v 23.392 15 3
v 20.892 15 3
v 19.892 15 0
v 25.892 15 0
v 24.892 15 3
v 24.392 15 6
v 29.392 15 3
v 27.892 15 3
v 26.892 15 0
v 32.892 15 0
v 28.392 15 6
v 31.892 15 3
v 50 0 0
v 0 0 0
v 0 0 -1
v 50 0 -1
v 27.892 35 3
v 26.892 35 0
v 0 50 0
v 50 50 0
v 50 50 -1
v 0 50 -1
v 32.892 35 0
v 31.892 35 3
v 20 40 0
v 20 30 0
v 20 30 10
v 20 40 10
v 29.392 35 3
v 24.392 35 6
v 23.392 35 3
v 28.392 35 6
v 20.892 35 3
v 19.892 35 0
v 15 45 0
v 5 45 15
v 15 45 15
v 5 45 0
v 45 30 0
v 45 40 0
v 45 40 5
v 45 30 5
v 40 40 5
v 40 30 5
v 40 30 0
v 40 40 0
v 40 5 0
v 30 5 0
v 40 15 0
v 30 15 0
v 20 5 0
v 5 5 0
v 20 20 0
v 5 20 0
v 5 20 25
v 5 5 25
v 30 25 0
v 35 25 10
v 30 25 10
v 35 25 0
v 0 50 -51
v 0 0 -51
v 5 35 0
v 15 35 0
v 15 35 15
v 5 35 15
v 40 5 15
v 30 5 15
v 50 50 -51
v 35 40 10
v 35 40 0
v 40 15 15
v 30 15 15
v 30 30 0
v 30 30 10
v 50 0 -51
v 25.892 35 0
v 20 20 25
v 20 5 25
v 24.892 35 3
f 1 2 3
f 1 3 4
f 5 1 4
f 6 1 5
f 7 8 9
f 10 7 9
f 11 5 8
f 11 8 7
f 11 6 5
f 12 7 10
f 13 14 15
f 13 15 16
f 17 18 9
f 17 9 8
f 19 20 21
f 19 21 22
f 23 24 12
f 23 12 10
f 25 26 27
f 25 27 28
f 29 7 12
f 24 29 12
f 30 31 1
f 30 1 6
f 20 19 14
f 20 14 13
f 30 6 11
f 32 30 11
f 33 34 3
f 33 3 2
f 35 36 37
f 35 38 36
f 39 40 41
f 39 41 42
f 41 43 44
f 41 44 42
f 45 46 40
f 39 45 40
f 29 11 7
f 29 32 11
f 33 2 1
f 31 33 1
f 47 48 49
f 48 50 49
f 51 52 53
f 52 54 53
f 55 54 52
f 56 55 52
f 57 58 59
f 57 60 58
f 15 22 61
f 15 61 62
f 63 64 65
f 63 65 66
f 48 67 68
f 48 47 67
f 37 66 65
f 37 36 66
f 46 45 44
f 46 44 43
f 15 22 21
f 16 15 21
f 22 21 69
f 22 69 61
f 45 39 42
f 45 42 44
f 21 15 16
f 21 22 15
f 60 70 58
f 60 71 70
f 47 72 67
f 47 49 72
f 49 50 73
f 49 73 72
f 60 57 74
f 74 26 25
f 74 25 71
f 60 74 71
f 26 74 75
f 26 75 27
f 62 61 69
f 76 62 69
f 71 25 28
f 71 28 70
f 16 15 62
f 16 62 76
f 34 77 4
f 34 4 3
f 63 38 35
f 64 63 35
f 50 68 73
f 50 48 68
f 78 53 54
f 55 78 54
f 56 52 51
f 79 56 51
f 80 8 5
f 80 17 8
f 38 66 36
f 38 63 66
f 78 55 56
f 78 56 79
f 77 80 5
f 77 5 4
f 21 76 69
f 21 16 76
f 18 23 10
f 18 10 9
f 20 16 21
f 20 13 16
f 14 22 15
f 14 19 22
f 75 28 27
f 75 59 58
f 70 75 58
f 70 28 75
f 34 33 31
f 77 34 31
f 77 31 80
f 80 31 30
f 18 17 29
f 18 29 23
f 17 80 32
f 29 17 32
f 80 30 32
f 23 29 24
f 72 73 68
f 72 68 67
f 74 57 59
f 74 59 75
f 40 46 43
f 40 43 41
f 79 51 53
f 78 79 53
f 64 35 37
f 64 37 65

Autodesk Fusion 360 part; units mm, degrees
sketch "Skizze1" plane through (0, 0, 0) normal (0, 0, 1) x (1, 0, 0)
  line L0 (0, 0) -> (50, 0)
  line L1 (50, 0) -> (50, 50)
  line L2 (50, 50) -> (0, 50)
  line L3 (0, 50) -> (0, 0)
  line L4 (20, 20) -> (5, 20)
  line L5 (5, 20) -> (5, 5)
  line L6 (5, 5) -> (20, 5)
  line L7 (20, 5) -> (20, 20)
  line L8 (20, 40) -> (35, 40)
  line L9 (35, 40) -> (35, 25)
  line L10 (35, 25) -> (30, 25)
  line L11 (30, 25) -> (30, 30)
  line L12 (30, 30) -> (20, 30)
  line L13 (20, 30) -> (20, 40)
  line L14 (5, 45) -> (15, 45)
  line L15 (15, 45) -> (15, 35)
  line L16 (15, 35) -> (5, 35)
  line L17 (5, 35) -> (5, 45)
  line L18 (30, 15) -> (40, 15)
  line L19 (40, 15) -> (40, 5)
  line L20 (40, 5) -> (30, 5)
  line L21 (30, 5) -> (30, 15)
  line L22 (40, 40) -> (45, 40)
  line L23 (45, 40) -> (45, 30)
  line L24 (45, 30) -> (40, 30)
  line L25 (40, 30) -> (40, 40)
extrude "Extrusion1" add sketch "Skizze1" along normal blind 25 contours L4 L5 L6 L7 makes body 1 in component "Großer Block"
extrude "Extrusion1'" add sketch "Skizze1" along normal blind 15 separate body contours L18 L19 L20 L21 makes body 2 in component "Medium Block 1"
extrude "Extrusion1''" add sketch "Skizze1" along normal blind 15 separate body contours L14 L15 L16 L17 makes body 3 in component "Medium Block 2#"
extrude "Extrusion1'''" add sketch "Skizze1" along normal blind 10 separate body contours L8 L9 L10 L11 L12 L13 makes body 4 in component "L Block"
extrude "Extrusion1''''" add sketch "Skizze1" along normal blind 5 separate body contours L22 L23 L24 L25 makes body 5 in component "Smal Block 1"
extrude "Extrusion1'''''" add sketch "Skizze1" against normal blind 1 separate body contours L0 L1 L2 L3 | L4 L5 L6 L7 | L8 L9 L10 L11 L12 L13 | L14 L15 L16 L17 | L18 L19 L20 L21 | L22 L23 L24 L25 makes body 6 in component "Boden"
extrude "Extrusion1''''''" add 1 faces at (16.6667, 33.3333, -1) along direction (0, 0, -1) blind 50 separate body on bodies 6 makes body 7 in component "Ground below"
ref_plane "Arbeitsebene1" through (25, 25, -26) normal (0, -1, 0) x (-1, 0, 0)
sketch "Skizze4" plane through (25, 25, -26) normal (0, -1, 0) x (1, 0, 0)
  line L0 (-5.1085, 26) -> (-4.1085, 29)
  line L1 (-4.1085, 29) -> (-0.1085, 29)
  line L2 (-0.1085, 29) -> (0.8915, 26)
  line L3 (0.8915, 26) -> (-5.1085, 26)
  line L4 (6.8915, 29) -> (7.8915, 26)
  line L5 (1.8915, 26) -> (2.8915, 29)
  line L6 (2.8915, 29) -> (6.8915, 29)
  line L7 (7.8915, 26) -> (1.8915, 26)
  line L8 (3.3915, 32) -> (4.3915, 29)
  line L9 (-1.6085, 29) -> (-0.6085, 32)
  line L10 (-0.6085, 32) -> (3.3915, 32)
  line L11 (4.3915, 29) -> (-1.6085, 29)
  line L12 (-25, 26) -> (25, 26)
  dimension "d20" = 4
  dimension "d21" = 6
  dimension "d22" = 1
  dimension "d23" = 3
  dimension "d32" = 6
  dimension "d33" = 4
  dimension "d34" = 1
  dimension "d35" = 3
  dimension "d36" = 6
  dimension "d37" = 4
  dimension "d38" = 1
  dimension "d39" = 3
  dimension "d40" = 1
  dimension "d41" = 1.5
extrude "Extrusion1'''''''" add sketch "Skizze4" along normal mid plane 20 separate body contours L0 L1 L2 L3 L11 L12 | L1 L6 L8 L9 L10 L11 | L4 L5 L6 L7 L11 L12 makes body 8 in component "Ore"
component "Großer Block" placed x (1, 0, 0) y (0, 1, 0) z (0, 0, 1) at (0, 0, 0)
component "Medium Block 1" placed x (1, 0, 0) y (0, 1, 0) z (0, 0, 1) at (0, 0, 0)
component "Medium Block 2#" placed x (1, 0, 0) y (0, 1, 0) z (0, 0, 1) at (0, 0, 0)
component "L Block" placed x (1, 0, 0) y (0, 1, 0) z (0, 0, 1) at (0, 0, 0)
component "Smal Block 1" placed x (1, 0, 0) y (0, 1, 0) z (0, 0, 1) at (0, 0, 0)
component "Boden" placed x (1, 0, 0) y (0, 1, 0) z (0, 0, 1) at (0, 0, 0)
component "Ground below" placed x (1, 0, 0) y (0, 1, 0) z (0, 0, 1) at (0, 0, 0)
component "Ore" placed x (1, 0, 0) y (0, 1, 0) z (0, 0, 1) at (0, 0, 0)
equation "d32 = d21"
equation "d33 = d20"
equation "d34 = d22"
equation "d35 = d23"
equation "d36 = d21"
equation "d37 = d20"
equation "d38 = d22"
equation "d39 = d23"
equation "d41 = ( d36 - d40 ) / 2 - d22"
